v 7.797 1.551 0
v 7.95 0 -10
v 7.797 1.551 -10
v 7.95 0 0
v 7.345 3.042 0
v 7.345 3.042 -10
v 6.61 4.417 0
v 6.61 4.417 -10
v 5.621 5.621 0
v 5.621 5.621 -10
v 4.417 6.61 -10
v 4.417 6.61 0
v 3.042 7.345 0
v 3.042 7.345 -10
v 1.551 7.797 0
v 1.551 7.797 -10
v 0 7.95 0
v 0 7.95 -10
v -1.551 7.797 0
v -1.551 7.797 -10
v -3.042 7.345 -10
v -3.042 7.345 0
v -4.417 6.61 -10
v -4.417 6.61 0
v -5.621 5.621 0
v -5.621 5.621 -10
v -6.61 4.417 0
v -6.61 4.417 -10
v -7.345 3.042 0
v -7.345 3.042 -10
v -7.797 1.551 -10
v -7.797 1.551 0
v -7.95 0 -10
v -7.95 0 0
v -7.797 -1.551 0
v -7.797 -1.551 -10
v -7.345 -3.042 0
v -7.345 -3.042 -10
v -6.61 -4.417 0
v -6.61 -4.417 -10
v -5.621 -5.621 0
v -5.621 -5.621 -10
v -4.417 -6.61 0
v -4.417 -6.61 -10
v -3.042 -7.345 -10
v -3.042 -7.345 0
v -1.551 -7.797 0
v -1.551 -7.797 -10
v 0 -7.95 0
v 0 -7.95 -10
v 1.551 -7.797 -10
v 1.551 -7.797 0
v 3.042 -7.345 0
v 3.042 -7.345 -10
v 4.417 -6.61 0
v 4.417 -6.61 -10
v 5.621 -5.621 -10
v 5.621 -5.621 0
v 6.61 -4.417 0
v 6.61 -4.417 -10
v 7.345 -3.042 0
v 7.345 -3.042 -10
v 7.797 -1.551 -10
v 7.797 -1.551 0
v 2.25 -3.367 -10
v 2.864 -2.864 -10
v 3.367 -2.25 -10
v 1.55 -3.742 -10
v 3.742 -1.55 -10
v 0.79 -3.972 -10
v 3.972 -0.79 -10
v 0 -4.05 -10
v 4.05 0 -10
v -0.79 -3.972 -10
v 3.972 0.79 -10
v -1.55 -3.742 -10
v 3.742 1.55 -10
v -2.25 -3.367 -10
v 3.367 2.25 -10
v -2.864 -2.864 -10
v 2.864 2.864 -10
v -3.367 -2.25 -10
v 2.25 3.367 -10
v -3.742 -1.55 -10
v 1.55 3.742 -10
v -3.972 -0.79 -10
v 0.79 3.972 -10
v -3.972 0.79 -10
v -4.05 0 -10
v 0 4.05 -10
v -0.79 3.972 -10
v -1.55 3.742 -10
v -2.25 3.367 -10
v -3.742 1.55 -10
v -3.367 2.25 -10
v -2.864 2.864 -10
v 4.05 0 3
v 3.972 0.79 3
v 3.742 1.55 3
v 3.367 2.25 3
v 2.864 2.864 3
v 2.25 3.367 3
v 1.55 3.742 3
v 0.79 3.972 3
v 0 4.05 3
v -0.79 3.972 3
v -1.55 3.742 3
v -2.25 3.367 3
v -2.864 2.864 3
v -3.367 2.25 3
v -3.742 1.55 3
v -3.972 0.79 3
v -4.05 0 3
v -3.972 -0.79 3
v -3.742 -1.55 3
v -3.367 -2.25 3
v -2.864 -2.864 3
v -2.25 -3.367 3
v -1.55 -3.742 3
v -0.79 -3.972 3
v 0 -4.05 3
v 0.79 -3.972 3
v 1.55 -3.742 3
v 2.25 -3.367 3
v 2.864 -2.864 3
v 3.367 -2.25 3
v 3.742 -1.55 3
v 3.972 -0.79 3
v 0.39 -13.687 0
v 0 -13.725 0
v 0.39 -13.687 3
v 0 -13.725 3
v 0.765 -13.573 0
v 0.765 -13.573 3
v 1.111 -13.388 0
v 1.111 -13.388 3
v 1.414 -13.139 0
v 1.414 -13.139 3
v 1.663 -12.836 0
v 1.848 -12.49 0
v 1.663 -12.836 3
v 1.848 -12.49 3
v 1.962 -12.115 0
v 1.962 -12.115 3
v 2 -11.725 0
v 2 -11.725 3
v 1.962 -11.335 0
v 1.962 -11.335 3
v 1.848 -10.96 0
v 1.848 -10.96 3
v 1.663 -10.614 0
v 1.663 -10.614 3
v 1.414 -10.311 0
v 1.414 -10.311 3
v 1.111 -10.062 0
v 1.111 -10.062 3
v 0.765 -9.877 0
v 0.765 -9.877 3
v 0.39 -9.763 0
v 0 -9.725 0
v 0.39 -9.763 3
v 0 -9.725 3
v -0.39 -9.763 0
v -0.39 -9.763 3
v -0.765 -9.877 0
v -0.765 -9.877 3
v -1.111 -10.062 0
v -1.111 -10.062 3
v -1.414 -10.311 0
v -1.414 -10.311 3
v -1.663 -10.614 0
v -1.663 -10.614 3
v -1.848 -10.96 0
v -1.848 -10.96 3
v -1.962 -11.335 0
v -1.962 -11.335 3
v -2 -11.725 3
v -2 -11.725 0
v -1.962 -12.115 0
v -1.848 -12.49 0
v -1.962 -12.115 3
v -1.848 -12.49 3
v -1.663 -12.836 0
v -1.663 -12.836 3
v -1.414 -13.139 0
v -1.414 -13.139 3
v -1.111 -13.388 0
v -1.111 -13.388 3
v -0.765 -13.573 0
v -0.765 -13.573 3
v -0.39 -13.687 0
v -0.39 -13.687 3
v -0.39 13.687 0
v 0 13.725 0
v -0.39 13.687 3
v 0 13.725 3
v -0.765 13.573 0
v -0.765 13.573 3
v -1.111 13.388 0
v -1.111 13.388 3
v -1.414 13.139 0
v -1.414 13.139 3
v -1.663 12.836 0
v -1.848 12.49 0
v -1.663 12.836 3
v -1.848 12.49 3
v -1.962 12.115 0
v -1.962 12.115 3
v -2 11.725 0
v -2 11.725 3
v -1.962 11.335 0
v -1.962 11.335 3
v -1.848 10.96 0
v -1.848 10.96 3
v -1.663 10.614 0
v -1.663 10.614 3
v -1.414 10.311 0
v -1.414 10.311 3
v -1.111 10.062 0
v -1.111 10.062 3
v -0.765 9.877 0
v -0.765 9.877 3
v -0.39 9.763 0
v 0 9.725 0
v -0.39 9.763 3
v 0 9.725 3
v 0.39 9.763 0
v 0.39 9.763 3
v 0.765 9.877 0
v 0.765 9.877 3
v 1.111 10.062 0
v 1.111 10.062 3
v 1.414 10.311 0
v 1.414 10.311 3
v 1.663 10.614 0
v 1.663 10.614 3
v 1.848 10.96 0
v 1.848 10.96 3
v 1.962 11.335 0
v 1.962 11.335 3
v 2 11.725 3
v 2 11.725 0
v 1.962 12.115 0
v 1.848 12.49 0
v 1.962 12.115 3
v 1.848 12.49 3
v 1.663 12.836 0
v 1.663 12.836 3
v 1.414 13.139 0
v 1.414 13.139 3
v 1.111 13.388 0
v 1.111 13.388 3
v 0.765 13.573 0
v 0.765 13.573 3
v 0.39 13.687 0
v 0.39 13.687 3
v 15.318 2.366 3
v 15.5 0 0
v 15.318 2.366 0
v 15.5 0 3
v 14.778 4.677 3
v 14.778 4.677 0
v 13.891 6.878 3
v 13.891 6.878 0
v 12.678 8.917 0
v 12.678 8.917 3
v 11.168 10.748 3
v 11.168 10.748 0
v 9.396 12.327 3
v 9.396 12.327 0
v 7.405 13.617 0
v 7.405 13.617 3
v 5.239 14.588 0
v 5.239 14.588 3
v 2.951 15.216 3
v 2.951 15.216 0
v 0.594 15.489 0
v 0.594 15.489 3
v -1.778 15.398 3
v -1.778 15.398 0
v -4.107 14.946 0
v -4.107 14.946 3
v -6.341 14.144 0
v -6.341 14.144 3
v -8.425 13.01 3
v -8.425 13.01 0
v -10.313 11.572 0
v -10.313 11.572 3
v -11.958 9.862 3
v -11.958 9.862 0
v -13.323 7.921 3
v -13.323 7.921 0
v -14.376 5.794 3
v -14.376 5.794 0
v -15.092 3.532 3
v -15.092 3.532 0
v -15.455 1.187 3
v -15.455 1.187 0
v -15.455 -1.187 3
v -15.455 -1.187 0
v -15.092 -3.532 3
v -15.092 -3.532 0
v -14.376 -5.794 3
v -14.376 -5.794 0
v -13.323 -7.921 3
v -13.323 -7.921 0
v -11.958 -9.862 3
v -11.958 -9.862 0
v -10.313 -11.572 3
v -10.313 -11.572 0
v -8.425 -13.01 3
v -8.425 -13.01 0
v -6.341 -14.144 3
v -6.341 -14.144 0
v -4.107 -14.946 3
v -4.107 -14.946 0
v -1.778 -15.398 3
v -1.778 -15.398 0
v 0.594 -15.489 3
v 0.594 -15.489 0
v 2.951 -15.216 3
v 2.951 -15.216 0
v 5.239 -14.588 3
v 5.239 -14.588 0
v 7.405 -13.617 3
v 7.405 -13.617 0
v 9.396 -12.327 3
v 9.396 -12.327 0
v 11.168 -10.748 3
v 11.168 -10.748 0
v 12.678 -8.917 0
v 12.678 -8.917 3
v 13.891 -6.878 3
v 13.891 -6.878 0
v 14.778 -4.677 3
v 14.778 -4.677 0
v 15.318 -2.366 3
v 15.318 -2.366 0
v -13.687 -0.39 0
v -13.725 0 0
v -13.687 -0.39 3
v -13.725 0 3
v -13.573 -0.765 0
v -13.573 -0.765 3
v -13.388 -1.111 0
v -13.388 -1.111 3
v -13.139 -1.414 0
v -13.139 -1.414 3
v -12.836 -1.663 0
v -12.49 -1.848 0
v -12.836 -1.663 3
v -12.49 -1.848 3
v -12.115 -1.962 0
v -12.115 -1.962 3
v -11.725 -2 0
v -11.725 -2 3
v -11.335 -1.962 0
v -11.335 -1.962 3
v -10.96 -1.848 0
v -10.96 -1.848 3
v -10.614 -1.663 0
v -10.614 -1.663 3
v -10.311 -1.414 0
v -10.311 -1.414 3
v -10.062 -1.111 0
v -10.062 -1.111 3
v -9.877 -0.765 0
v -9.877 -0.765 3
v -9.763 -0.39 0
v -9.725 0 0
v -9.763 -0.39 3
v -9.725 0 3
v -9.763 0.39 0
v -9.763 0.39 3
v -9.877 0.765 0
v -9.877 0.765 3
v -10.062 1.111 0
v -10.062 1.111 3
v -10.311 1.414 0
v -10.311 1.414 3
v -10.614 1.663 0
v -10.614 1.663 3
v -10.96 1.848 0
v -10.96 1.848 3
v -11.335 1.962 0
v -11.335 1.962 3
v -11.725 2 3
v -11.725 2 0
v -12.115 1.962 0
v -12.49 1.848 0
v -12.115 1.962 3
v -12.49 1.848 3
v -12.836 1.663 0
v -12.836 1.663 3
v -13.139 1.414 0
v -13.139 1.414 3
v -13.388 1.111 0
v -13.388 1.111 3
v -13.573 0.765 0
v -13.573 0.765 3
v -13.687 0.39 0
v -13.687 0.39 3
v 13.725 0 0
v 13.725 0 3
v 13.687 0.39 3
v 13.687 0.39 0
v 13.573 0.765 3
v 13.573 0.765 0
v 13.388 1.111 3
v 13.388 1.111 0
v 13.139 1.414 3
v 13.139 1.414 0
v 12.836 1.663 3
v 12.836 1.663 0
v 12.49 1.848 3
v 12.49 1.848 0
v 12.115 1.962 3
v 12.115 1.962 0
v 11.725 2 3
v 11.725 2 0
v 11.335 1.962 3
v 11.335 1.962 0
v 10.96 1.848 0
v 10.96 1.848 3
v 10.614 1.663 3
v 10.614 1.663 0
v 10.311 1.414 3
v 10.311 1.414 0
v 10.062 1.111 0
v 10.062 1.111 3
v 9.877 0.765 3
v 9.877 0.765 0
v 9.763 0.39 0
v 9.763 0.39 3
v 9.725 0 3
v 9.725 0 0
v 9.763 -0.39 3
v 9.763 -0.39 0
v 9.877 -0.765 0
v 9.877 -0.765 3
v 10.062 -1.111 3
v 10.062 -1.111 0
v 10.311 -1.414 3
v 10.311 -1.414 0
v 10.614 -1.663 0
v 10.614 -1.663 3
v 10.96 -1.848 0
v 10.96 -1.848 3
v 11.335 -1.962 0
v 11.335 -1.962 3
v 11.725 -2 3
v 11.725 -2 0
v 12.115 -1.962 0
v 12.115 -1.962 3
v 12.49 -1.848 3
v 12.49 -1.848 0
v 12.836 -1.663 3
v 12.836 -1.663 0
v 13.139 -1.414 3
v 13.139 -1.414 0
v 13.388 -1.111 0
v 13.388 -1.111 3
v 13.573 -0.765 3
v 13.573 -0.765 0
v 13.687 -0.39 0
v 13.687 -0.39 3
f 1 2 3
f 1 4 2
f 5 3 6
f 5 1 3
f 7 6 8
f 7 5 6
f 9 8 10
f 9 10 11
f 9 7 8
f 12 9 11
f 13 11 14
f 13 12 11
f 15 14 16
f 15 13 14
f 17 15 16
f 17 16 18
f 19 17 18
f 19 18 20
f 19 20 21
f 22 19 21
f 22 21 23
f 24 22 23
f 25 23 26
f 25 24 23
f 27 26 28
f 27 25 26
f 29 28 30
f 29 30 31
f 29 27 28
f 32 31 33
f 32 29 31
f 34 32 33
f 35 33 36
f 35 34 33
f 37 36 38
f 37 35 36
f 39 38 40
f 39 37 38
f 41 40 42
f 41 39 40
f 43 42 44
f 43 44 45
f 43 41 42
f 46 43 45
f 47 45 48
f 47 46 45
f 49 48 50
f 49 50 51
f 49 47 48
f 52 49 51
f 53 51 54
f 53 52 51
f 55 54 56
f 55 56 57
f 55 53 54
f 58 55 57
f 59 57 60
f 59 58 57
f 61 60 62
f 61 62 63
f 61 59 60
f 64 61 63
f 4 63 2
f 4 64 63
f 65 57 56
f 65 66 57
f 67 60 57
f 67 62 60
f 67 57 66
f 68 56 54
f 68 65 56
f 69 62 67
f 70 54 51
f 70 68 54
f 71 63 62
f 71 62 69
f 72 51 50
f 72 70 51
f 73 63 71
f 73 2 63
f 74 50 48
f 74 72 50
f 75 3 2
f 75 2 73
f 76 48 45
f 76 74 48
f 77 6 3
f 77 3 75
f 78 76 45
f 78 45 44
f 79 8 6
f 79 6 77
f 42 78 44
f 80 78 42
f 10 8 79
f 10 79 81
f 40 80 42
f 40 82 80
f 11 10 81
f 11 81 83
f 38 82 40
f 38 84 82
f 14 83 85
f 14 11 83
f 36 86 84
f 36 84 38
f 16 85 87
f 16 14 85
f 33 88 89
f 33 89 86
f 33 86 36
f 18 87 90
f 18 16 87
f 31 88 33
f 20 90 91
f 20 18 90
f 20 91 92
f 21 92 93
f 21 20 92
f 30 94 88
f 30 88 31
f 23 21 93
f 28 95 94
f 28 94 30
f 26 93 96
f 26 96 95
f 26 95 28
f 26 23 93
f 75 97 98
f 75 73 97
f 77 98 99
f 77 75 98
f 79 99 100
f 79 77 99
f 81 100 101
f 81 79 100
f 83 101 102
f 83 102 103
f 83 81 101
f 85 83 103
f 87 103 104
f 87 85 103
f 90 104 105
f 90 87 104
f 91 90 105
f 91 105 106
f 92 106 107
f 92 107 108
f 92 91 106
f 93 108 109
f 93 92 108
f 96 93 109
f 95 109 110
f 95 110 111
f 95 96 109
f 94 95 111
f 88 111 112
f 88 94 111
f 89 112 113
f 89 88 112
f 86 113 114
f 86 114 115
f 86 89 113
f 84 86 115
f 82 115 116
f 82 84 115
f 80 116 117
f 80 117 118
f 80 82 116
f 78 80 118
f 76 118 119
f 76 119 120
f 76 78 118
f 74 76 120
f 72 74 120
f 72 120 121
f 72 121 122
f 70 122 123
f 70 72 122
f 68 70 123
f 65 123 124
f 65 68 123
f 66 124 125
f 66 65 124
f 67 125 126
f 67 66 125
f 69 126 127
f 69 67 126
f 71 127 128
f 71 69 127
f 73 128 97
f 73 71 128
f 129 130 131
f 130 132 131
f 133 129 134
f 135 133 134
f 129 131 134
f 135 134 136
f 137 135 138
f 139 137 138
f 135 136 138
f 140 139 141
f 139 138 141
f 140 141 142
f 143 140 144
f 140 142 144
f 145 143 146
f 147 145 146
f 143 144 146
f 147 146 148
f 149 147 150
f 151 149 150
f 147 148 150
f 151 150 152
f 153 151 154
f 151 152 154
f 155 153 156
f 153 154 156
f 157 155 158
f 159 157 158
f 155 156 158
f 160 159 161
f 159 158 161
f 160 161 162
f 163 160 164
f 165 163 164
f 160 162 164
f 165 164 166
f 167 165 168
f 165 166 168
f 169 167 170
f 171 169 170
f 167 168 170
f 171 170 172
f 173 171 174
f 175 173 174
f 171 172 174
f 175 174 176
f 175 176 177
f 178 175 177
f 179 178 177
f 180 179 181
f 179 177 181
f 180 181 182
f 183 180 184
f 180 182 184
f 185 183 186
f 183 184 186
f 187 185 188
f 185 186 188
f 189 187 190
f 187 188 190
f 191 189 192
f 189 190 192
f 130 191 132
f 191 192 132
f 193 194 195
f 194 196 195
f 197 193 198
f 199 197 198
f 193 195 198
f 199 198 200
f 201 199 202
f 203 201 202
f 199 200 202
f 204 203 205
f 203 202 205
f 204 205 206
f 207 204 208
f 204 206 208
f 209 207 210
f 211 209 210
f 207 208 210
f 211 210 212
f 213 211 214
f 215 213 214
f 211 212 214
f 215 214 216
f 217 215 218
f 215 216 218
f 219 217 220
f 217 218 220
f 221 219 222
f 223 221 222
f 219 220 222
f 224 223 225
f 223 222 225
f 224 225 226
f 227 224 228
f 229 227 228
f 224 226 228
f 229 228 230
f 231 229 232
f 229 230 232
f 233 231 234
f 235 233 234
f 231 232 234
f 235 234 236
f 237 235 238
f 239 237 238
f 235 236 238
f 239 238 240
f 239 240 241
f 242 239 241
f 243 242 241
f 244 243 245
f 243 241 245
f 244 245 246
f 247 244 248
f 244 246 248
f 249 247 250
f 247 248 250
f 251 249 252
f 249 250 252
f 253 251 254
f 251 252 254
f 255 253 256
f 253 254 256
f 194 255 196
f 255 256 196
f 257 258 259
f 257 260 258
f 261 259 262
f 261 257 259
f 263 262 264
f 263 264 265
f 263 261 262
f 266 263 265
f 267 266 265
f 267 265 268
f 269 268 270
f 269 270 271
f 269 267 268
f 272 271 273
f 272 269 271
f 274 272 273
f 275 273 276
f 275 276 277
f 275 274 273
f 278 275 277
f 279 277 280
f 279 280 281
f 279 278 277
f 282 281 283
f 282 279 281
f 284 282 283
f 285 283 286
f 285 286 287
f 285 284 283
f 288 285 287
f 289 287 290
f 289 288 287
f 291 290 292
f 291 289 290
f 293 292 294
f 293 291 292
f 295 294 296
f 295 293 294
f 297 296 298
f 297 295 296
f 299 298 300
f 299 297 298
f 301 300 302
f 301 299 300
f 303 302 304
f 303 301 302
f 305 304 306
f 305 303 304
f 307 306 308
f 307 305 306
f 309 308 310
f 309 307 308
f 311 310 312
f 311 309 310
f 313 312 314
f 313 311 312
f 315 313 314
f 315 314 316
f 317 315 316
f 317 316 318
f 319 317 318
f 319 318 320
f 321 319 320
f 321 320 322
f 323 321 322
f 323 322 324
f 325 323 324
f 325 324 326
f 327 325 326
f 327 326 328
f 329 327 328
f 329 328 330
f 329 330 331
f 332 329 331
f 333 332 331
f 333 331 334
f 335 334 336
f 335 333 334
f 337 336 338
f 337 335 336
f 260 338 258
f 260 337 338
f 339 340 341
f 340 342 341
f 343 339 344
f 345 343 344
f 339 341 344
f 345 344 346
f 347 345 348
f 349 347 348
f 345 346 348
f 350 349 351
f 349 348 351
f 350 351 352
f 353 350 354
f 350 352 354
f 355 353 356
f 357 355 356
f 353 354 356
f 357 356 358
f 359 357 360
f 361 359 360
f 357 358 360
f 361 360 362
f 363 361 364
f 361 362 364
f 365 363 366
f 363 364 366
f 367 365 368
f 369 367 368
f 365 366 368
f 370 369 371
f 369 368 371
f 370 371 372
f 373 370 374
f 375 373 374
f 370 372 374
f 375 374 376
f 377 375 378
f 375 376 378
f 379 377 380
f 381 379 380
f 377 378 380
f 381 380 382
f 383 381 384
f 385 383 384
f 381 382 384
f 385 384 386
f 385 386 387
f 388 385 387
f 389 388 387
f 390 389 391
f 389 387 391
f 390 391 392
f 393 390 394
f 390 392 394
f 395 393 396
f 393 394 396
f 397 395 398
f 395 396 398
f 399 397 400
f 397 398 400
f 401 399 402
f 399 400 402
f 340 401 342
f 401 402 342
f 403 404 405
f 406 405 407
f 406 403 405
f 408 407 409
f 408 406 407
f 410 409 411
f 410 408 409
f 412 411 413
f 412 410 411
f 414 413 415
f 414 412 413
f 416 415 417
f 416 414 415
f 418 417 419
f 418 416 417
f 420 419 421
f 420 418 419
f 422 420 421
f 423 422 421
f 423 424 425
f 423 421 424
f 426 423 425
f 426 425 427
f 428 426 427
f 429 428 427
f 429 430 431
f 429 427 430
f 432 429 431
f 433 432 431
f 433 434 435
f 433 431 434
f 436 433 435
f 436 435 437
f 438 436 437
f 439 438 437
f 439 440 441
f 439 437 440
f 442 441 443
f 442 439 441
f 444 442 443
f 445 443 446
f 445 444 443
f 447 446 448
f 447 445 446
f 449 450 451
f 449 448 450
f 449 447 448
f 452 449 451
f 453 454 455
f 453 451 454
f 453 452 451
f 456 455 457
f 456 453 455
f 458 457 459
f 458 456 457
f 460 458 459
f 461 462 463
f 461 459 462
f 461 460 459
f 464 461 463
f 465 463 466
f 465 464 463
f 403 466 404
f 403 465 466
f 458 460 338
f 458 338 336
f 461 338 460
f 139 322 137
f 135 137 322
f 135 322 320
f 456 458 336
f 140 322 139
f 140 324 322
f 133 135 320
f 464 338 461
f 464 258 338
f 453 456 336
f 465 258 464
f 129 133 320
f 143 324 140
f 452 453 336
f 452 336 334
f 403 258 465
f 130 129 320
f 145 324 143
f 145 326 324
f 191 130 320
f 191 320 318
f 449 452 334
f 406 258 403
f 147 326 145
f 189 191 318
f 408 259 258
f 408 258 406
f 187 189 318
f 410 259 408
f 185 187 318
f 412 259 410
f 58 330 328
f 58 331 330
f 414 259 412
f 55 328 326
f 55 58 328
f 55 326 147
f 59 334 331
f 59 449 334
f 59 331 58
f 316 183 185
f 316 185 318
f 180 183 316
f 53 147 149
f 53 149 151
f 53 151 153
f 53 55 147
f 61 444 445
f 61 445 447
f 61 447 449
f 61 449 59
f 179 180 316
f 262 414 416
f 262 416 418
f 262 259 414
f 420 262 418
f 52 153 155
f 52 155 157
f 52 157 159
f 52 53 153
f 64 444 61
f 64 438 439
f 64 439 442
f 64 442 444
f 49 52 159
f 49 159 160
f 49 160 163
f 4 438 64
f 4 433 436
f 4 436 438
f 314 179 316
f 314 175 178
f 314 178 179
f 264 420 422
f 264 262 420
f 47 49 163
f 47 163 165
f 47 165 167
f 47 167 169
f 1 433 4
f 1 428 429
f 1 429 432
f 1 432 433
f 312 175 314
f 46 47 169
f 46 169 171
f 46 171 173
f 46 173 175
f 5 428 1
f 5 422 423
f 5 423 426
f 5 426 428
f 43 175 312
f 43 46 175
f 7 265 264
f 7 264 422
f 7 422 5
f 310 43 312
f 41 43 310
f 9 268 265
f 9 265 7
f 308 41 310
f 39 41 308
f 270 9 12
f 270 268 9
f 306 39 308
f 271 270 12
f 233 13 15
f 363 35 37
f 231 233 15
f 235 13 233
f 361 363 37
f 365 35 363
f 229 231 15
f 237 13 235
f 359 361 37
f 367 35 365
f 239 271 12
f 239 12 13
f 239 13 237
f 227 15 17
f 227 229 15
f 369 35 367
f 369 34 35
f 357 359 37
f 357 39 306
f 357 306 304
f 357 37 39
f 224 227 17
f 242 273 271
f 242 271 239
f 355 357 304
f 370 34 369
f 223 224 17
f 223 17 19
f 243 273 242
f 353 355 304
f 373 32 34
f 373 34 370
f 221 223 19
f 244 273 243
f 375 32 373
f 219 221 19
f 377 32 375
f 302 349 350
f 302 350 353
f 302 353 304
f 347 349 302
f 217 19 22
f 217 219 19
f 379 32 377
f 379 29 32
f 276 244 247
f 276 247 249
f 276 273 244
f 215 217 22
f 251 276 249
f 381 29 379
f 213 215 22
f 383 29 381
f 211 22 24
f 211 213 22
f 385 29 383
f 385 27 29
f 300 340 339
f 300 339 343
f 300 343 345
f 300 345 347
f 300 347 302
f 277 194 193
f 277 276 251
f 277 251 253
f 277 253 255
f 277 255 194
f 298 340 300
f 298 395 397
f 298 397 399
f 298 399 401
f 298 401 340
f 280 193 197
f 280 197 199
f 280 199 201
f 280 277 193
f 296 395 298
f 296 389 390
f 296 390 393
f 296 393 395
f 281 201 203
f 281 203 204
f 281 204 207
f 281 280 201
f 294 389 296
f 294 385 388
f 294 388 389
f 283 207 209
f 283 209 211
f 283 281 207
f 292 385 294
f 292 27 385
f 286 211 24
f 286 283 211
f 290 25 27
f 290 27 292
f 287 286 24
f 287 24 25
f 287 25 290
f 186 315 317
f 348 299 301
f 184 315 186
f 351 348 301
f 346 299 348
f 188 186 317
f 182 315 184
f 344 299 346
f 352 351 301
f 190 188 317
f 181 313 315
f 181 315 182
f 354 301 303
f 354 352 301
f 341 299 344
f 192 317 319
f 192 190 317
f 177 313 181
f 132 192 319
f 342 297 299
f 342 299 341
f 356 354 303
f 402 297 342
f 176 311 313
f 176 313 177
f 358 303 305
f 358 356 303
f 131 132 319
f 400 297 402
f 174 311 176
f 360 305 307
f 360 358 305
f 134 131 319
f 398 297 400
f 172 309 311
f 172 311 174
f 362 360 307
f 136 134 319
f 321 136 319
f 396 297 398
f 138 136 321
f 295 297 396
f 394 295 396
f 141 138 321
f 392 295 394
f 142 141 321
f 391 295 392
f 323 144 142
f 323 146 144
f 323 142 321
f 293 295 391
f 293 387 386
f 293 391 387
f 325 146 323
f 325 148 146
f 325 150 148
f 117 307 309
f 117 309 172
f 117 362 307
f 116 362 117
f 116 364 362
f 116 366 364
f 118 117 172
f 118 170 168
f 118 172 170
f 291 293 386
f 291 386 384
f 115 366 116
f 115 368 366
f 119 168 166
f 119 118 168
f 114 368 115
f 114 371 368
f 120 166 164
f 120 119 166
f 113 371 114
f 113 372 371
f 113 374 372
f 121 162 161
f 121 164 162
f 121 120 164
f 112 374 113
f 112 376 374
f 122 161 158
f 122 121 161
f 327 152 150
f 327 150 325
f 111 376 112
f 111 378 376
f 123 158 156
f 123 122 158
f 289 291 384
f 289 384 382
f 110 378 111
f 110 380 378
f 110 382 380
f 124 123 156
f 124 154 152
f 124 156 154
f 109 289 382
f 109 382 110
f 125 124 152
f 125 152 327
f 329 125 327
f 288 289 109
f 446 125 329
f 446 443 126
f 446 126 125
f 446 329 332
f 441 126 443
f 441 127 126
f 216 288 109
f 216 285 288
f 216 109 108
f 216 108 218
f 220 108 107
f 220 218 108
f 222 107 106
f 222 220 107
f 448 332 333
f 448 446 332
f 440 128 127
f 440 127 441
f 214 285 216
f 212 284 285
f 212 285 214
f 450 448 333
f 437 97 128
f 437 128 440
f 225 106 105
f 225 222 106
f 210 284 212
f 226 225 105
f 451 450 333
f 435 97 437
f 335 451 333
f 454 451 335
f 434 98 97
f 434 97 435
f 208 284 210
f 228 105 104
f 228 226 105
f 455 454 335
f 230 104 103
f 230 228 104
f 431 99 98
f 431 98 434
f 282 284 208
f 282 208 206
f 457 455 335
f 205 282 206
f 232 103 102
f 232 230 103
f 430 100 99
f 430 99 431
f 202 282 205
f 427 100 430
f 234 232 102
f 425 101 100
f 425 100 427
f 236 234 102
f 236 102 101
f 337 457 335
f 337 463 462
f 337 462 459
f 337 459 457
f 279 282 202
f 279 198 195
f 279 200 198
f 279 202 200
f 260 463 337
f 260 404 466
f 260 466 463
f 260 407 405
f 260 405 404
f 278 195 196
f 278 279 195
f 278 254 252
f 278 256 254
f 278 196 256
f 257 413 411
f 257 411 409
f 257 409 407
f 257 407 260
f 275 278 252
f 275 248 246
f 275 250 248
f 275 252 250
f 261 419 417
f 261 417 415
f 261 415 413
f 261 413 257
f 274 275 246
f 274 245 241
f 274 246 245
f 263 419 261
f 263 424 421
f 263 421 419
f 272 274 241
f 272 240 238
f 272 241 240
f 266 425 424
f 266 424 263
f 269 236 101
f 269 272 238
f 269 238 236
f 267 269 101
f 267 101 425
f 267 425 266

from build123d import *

# Parameters (mm, degrees)
SKETCH009_R           = 2
POCKET001_DEPTH       = 101.455907
POCKET001_DEPTH_BACK  = 94.455907
POLARPATTERN001_COUNT = 4


with BuildPart() as part:
    # Sketch008 → Revolution005 (revolve)
    with BuildSketch(Plane.XZ):
        Polygon((4.05, 3), (4.05, -10), (7.95, -10), (7.95, 0), (15.5, 0), (15.5, 3), align=None)
    revolve(axis=Axis((0, 0, 0), (0, 0, 1)))

    # Sketch009 → Pocket001 (cut, two sides)
    with BuildSketch(Plane.XY) as pocket001_sk:
        with Locations((11.725, 0)):
            Circle(SKETCH009_R)
    pocket001 = extrude(amount=-POCKET001_DEPTH, mode=Mode.SUBTRACT) + extrude(pocket001_sk.sketch, amount=POCKET001_DEPTH_BACK, mode=Mode.SUBTRACT)

    # PolarPattern001: Pocket001 ×4 about axis
    polarpattern001_axis = Axis((0, 0, 0), (0, 0, 1))
    for i in range(1, POLARPATTERN001_COUNT):
        add(pocket001.rotate(polarpattern001_axis, i * 360 / POLARPATTERN001_COUNT), mode=Mode.SUBTRACT)


solid = part.part
